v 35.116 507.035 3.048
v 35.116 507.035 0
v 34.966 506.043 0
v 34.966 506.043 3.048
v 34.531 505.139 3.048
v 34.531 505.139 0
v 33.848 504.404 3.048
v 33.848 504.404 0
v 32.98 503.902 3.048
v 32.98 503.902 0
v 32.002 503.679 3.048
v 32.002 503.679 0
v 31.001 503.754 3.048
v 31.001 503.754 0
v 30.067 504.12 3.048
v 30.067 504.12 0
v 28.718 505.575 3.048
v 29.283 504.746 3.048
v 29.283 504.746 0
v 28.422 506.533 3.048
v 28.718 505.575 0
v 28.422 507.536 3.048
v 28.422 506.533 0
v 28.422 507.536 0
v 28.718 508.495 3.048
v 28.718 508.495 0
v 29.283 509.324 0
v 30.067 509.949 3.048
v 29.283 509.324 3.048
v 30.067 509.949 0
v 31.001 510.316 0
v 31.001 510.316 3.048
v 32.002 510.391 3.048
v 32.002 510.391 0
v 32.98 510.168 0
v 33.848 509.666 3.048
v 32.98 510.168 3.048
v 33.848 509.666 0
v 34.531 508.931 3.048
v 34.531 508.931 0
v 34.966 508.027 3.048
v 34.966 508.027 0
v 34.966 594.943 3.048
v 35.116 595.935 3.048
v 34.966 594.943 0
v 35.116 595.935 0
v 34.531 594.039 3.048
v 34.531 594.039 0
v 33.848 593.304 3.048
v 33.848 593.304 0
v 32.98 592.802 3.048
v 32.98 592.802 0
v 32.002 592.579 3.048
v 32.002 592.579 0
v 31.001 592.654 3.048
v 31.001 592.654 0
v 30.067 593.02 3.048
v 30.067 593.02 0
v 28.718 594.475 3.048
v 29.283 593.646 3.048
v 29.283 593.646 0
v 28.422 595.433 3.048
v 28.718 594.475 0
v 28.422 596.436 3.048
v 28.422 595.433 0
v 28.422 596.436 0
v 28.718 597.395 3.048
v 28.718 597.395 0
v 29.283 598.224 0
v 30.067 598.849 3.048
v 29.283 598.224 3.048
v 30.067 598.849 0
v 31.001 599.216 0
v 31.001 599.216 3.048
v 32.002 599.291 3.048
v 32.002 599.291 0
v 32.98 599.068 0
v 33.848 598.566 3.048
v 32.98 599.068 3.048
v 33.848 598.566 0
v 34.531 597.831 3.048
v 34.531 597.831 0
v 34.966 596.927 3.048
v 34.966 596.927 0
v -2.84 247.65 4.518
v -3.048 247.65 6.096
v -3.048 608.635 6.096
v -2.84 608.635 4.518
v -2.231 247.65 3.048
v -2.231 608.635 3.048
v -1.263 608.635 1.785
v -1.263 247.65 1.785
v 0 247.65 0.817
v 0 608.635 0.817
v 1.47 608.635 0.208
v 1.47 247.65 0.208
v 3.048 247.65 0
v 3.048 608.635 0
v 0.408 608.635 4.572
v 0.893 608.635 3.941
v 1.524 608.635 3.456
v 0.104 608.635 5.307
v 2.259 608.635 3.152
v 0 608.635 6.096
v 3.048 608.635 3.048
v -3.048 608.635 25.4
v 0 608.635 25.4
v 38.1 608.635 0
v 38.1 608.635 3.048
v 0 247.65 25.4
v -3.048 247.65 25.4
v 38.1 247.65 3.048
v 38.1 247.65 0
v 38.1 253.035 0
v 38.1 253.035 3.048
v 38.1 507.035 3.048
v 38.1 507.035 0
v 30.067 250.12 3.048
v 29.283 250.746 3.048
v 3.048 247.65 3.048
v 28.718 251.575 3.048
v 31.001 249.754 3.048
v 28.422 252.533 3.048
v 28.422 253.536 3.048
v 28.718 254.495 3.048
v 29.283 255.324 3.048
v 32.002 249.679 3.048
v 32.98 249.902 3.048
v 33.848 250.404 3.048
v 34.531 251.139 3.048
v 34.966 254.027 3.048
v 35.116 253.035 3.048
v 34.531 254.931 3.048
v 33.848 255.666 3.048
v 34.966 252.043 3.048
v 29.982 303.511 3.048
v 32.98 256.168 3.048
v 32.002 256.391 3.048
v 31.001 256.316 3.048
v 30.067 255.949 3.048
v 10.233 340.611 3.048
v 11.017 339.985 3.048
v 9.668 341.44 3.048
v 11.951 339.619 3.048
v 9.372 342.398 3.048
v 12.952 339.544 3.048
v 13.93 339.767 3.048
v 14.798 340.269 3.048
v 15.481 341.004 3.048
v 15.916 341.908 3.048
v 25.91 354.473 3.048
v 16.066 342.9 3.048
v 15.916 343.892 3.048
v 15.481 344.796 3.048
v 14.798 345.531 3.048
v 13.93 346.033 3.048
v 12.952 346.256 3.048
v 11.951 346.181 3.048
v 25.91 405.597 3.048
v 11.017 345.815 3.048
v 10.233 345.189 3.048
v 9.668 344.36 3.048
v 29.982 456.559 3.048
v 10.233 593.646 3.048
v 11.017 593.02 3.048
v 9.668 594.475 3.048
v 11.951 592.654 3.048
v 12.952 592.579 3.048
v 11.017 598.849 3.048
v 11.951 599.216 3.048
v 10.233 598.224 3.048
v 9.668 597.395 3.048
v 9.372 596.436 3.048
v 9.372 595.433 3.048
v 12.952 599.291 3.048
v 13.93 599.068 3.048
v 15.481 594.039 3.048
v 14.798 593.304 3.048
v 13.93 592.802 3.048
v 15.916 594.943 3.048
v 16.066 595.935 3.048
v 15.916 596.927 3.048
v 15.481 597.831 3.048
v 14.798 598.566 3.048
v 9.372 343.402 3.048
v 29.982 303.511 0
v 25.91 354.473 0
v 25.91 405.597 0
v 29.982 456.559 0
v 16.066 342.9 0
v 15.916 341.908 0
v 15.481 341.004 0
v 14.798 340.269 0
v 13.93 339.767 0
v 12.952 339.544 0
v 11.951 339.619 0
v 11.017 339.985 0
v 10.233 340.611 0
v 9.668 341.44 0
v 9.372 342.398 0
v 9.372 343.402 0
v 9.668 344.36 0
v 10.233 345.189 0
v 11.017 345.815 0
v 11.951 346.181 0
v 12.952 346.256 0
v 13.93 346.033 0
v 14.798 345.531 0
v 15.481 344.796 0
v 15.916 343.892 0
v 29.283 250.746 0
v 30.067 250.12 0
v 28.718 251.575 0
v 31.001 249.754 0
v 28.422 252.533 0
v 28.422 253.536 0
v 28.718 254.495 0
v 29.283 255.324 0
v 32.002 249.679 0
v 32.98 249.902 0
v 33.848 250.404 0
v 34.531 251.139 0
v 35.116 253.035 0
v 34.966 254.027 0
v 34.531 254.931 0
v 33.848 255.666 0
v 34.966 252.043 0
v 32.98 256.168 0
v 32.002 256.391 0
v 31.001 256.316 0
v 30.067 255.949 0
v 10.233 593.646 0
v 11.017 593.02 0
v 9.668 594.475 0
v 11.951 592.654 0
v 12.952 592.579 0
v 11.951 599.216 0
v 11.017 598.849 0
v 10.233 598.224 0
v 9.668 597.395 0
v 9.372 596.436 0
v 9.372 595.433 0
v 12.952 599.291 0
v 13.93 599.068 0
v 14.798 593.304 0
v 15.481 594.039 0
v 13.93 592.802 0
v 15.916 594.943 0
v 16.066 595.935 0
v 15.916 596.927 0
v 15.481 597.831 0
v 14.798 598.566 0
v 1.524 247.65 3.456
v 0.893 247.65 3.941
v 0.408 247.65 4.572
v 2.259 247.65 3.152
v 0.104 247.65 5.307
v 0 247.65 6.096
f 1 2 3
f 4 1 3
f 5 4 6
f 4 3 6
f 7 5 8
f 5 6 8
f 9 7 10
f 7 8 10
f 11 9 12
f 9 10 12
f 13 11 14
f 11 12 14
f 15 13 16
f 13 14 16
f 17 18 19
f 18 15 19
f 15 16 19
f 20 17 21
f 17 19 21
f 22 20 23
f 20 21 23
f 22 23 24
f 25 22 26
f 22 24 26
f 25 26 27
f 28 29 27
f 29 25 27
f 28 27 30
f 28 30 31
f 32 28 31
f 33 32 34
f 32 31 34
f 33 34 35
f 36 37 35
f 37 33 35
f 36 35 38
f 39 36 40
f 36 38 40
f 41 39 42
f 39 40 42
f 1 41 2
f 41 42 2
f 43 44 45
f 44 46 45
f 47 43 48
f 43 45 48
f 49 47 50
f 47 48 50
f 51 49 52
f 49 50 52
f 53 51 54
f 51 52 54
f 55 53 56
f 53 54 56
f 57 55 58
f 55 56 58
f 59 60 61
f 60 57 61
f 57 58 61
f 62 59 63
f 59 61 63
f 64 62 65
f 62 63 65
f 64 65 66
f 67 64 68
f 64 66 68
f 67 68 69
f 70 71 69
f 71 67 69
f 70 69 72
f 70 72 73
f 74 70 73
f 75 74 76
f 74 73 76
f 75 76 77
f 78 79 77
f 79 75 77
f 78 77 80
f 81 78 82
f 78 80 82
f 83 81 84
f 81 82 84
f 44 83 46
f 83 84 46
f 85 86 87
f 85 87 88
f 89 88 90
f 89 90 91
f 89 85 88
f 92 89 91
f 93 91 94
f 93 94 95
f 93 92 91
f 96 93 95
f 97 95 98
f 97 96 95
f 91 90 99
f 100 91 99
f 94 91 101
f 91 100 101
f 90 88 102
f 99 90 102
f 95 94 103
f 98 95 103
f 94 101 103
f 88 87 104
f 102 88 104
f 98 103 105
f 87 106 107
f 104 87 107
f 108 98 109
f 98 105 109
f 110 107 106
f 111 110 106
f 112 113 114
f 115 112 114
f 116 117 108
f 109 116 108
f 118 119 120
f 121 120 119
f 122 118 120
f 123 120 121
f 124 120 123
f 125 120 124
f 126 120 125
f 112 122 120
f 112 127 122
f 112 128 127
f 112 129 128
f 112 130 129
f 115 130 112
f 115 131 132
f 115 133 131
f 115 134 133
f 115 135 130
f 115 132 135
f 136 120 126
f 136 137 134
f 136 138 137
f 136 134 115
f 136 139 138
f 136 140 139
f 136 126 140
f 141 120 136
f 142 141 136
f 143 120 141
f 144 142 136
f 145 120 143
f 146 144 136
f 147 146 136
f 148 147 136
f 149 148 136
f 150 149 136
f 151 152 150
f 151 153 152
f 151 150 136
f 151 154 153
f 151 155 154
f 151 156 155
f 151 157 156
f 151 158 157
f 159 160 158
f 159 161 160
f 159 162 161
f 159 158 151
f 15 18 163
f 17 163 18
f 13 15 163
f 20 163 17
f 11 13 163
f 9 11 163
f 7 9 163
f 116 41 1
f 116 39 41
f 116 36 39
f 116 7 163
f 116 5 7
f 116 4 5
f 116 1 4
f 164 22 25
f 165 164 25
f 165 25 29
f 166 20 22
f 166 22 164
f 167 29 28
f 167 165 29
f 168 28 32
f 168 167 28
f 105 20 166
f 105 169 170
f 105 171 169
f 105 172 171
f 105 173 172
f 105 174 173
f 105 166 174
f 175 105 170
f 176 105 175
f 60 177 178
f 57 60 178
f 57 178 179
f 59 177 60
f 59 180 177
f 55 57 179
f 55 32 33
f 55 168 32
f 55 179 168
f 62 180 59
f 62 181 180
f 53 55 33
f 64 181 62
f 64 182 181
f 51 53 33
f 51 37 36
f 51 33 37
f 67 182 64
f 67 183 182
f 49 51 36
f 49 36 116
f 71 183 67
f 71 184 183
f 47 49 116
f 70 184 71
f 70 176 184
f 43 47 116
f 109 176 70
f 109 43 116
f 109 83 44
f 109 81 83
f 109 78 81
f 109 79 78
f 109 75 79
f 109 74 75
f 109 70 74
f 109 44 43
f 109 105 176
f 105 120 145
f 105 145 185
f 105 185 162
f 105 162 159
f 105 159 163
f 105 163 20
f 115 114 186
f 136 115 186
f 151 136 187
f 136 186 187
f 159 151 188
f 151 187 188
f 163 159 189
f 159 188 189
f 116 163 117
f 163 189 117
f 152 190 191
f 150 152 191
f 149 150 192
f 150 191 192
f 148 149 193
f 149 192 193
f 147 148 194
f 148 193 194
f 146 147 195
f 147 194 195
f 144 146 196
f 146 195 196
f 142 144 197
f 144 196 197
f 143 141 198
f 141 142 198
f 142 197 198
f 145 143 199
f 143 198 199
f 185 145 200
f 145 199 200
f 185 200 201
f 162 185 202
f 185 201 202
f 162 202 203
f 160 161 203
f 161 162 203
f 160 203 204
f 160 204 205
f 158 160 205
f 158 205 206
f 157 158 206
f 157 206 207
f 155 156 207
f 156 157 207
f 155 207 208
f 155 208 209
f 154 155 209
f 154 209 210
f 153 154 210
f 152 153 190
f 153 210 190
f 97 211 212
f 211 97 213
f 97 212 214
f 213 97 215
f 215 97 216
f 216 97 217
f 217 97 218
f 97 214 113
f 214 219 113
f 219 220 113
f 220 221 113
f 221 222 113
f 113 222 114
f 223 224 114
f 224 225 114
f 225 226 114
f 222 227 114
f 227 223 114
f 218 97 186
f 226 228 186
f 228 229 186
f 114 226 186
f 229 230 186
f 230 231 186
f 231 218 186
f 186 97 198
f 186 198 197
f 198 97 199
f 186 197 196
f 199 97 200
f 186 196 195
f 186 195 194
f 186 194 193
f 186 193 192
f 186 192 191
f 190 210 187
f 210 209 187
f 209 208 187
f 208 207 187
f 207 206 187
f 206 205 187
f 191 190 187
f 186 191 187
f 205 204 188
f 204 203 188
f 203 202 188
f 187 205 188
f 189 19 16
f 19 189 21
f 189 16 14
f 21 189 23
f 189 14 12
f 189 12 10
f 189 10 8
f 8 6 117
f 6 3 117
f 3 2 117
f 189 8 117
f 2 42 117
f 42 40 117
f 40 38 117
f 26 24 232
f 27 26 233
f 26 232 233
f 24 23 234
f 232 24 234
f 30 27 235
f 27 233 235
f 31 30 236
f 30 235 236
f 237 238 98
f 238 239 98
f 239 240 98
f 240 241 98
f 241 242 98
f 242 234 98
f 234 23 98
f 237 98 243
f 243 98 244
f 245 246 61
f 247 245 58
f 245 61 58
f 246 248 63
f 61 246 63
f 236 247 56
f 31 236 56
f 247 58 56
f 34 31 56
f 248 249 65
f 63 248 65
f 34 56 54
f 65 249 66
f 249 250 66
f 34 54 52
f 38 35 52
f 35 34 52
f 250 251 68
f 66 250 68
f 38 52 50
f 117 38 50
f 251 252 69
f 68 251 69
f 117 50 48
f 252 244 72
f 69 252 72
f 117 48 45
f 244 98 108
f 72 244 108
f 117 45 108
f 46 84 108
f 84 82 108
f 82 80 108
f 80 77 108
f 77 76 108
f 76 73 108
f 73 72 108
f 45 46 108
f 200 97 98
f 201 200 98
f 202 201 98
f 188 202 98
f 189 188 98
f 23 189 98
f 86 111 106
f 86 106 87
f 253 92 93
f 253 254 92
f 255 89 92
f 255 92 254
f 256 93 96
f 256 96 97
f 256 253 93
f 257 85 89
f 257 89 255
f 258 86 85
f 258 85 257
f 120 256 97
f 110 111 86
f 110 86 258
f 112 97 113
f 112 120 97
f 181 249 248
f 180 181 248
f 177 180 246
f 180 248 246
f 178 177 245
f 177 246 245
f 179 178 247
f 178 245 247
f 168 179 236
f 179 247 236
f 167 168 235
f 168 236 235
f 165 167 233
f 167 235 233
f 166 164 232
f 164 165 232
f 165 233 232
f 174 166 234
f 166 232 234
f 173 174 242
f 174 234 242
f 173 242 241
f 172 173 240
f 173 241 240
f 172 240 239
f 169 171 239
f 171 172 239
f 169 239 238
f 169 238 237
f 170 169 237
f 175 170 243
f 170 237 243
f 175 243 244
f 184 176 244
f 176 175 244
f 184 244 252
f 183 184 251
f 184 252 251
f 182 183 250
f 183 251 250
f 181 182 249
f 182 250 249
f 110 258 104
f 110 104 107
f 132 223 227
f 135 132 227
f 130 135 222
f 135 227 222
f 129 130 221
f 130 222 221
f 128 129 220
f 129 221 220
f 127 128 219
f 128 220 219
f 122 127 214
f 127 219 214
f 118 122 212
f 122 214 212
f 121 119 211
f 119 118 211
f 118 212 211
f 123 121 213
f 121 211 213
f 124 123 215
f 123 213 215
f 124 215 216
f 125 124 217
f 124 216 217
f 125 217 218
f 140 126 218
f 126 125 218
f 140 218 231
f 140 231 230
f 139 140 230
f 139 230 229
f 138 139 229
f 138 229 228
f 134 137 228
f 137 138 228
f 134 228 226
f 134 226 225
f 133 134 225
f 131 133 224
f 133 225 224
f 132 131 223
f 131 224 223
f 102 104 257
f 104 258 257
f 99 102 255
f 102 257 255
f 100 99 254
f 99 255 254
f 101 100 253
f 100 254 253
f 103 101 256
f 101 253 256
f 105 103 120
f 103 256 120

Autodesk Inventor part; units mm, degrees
ref_plane "YZ Plane" through (0, 0, 0) normal (1, 0, 0) x (0, 1, 0)
ref_plane "XZ Plane" through (0, 0, 0) normal (0, 1, 0) x (-1, 0, 0)
ref_plane "XY Plane" through (0, 0, 0) normal (0, 0, 1) x (1, 0, 0)
sketch "Sketch1" plane through (0, 0, 0) normal (0, 0, 1) x (1, 0, 0)
  line L0 (0, 0) -> (38.1, 0)
  line L1 (38.1, 0) -> (38.1, 253.0348)
  arc A0 (38.1, 507.0348) -> (38.1, 253.0348) centre (666.75, 380.0348) ccw
  line L2 (38.1, 507.0348) -> (38.1, 608.6348)
  line L3 (38.1, 608.6348) -> (0, 608.6348)
  line L4 (0, 608.6348) -> (0, 0)
  circle A1 centre (31.75, 151.4348) radius 3.3655
  circle A2 centre (31.75, 34.671) radius 3.3655
  circle A3 centre (12.7, 12.7) radius 3.3655
  circle A4 centre (12.7, 342.9) radius 3.3655
  circle A5 centre (12.7, 595.9348) radius 3.3655
  circle A6 centre (31.75, 12.7) radius 3.3655
  circle A7 centre (31.75, 253.0348) radius 3.3655
  circle A8 centre (31.75, 507.0348) radius 3.3655
  circle A9 centre (31.75, 595.9348) radius 3.3655
  line L5 (0, 557.8348) -> (0, 608.6348)
  line L6 (0, 50.8) -> (0, 0)
  line L7 (12.7, 342.9) -> (0, 304.3174) construction
  line L8 (0, 317.5) -> (0, 368.3)
  line L9 (0, 129.921) -> (12.7, 129.921) construction
  circle A10 centre (12.7, 129.921) radius 3.3655
  circle A11 centre (12.7, 174.371) radius 3.3655
  line L10 (9.3413, 197.482) -> (9.3413, 204.213)
  line L11 (16.0611, 204.488) -> (16.0611, 197.3435)
  arc A12 (16.0611, 204.488) -> (9.3413, 204.213) centre (12.6956, 204.488) ccw
  arc A13 (9.3413, 197.482) -> (16.0611, 197.3435) centre (12.6974, 197.231) ccw
  circle A14 centre (12.7, 217.188) radius 3.3655
  dimension "d0" = 38.1
  dimension "d2" = 101.6
  dimension "d4" = 457.2
  dimension "d5" = 101.6
  dimension "d6" = 666.75
  dimension "d7" = 641.35
  dimension "d9" = 116.7638
  dimension "d10" = 6.35
  dimension "d11" = 6.35
  dimension "d13" = 12.7
  dimension "d14" = 12.7
  dimension "d16" = 12.7
  dimension "d17" = 342.9
  dimension "d19" = 12.7
  dimension "d20" = 12.7
  dimension "d22" = 6.35
  dimension "d24" = 6.35
  dimension "d25" = 6.731
  dimension "d26" = 6.35
  dimension "hole" = 6.731
  dimension "d28" = 6.35
  dimension "d45" = 12.7
  dimension "d47" = 12.7
  dimension "d54" = 6.731
  dimension "d55" = 3.3655
  dimension "d56" = 3.3655
  dimension "d58" = 6.731
  dimension "d59" = 12.7
  dimension "d68" = 18.22
  dimension "d69" = 90
  dimension "d70" = 90
  dimension "d71" = 22.0389
  dimension "d72" = 28.7587
  dimension "d73" = 478.7138
  dimension "d74" = 6.35
  dimension "d75" = 6.35
  dimension "d76" = 595.9348
  dimension "d77" = 404.1468
  dimension "d78" = 411.2913
  dimension "d79" = 25.4
  dimension "d80" = 25.4
  dimension "d81" = 434.2638
  dimension "d82" = 50.8
  dimension "d83" = 240.3348
  dimension "d84" = 291.1348
  dimension "d85" = 557.8348
extrude "Plate4" add sketch "Sketch1" along normal blind 3.048
sketch "Sketch5" plane through (0, 0, 3.048) normal (0, 0, 1) x (1, 0, 0)
  line L0 (38.1, 0) -> (38.1, 253.0348) projected
  line L1 (0, 0) -> (38.1, 0)
  line L2 (38.1, 0) -> (38.1, 25.4)
  line L3 (38.1, 25.4) -> (0, 25.4)
  line L4 (0, 25.4) -> (0, 0)
  dimension "d96" = 25.4
extrude "Cut1" cut sketch "Sketch5" against normal blind 3.048
sketch "Sketch7" plane through (0, 25.4, 3.048) normal (-1, 0, 0) x (0, -1, 0)
  line L0 (-583.2348, 0) -> (0, 0)
  line L1 (0, 0) -> (0, 22.352)
  line L2 (0, 22.352) -> (-583.2348, 22.352)
  line L3 (-583.2348, 22.352) -> (-583.2348, 0)
edge flange "Flange3" height 25.4 angle 90 thickness 3.048 bend radius 3.048 thickness toward (-1, 0, 0) relief tear relief width 3.048 relief depth 1.524 edges at (0, 317.0174, 3.048) wall of the first edge with corners at (0, 608.6348, 3.048) (0, 25.4, 3.048) (0, 25.4, 25.4) (0, 608.6348, 25.4)
bend "Bend3"
corner "Corner3"
sketch "Sketch8" plane through (-3.048, 25.4, 25.4) normal (0, -1, 0) x (1, 0, 0)
  line L0 (0, 0) -> (41.148, 0)
  line L1 (41.148, 0) -> (41.148, -25.4)
  line L2 (41.148, -25.4) -> (0, -25.4)
  line L3 (0, -25.4) -> (0, 0)
  point P0 (3.048, -25.4)
extrude "Extrusion1" cut sketch "Sketch8" against normal blind 222.25
equation "\"d25\" = hole"
equation "\"d97\" = Thickness"
equation "\"d109\" = BendReliefWidth"
equation "\"d110\" = BendReliefDepth"
equation "\"d111\" = MinimumRemnant"
equation "\"d112\" = BendRadius"
equation "\"d115\" = BendRadius"
equation "\"d116\" = CornerReliefSize"
equation "\"d117\" = GapSize"
equation "\"d118\" = JacobiRadiusSize"
equation "\"BendRadius\" = Thickness"
equation "\"BendReliefWidth\" = Thickness"
equation "\"BendReliefDepth\" = 0.5 * Thickness"
equation "\"CornerReliefSize\" = 4 * Thickness"
equation "\"MinimumRemnant\" = 2 * Thickness"
equation "\"TransitionRadius\" = BendRadius"
equation "\"JacobiRadiusSize\" = BendRadius"
equation "\"GapSize\" = Thickness"
equation "\"d29\" = BendRadius"
equation "\"d32\" = BendRadius"
equation "\"d38\" = BendRadius"
equation "\"d60\" = BendRadius"
equation "\"Thickness\" = 3.048"
properties part number "Claw - Arm - Top (R) Bottom"
